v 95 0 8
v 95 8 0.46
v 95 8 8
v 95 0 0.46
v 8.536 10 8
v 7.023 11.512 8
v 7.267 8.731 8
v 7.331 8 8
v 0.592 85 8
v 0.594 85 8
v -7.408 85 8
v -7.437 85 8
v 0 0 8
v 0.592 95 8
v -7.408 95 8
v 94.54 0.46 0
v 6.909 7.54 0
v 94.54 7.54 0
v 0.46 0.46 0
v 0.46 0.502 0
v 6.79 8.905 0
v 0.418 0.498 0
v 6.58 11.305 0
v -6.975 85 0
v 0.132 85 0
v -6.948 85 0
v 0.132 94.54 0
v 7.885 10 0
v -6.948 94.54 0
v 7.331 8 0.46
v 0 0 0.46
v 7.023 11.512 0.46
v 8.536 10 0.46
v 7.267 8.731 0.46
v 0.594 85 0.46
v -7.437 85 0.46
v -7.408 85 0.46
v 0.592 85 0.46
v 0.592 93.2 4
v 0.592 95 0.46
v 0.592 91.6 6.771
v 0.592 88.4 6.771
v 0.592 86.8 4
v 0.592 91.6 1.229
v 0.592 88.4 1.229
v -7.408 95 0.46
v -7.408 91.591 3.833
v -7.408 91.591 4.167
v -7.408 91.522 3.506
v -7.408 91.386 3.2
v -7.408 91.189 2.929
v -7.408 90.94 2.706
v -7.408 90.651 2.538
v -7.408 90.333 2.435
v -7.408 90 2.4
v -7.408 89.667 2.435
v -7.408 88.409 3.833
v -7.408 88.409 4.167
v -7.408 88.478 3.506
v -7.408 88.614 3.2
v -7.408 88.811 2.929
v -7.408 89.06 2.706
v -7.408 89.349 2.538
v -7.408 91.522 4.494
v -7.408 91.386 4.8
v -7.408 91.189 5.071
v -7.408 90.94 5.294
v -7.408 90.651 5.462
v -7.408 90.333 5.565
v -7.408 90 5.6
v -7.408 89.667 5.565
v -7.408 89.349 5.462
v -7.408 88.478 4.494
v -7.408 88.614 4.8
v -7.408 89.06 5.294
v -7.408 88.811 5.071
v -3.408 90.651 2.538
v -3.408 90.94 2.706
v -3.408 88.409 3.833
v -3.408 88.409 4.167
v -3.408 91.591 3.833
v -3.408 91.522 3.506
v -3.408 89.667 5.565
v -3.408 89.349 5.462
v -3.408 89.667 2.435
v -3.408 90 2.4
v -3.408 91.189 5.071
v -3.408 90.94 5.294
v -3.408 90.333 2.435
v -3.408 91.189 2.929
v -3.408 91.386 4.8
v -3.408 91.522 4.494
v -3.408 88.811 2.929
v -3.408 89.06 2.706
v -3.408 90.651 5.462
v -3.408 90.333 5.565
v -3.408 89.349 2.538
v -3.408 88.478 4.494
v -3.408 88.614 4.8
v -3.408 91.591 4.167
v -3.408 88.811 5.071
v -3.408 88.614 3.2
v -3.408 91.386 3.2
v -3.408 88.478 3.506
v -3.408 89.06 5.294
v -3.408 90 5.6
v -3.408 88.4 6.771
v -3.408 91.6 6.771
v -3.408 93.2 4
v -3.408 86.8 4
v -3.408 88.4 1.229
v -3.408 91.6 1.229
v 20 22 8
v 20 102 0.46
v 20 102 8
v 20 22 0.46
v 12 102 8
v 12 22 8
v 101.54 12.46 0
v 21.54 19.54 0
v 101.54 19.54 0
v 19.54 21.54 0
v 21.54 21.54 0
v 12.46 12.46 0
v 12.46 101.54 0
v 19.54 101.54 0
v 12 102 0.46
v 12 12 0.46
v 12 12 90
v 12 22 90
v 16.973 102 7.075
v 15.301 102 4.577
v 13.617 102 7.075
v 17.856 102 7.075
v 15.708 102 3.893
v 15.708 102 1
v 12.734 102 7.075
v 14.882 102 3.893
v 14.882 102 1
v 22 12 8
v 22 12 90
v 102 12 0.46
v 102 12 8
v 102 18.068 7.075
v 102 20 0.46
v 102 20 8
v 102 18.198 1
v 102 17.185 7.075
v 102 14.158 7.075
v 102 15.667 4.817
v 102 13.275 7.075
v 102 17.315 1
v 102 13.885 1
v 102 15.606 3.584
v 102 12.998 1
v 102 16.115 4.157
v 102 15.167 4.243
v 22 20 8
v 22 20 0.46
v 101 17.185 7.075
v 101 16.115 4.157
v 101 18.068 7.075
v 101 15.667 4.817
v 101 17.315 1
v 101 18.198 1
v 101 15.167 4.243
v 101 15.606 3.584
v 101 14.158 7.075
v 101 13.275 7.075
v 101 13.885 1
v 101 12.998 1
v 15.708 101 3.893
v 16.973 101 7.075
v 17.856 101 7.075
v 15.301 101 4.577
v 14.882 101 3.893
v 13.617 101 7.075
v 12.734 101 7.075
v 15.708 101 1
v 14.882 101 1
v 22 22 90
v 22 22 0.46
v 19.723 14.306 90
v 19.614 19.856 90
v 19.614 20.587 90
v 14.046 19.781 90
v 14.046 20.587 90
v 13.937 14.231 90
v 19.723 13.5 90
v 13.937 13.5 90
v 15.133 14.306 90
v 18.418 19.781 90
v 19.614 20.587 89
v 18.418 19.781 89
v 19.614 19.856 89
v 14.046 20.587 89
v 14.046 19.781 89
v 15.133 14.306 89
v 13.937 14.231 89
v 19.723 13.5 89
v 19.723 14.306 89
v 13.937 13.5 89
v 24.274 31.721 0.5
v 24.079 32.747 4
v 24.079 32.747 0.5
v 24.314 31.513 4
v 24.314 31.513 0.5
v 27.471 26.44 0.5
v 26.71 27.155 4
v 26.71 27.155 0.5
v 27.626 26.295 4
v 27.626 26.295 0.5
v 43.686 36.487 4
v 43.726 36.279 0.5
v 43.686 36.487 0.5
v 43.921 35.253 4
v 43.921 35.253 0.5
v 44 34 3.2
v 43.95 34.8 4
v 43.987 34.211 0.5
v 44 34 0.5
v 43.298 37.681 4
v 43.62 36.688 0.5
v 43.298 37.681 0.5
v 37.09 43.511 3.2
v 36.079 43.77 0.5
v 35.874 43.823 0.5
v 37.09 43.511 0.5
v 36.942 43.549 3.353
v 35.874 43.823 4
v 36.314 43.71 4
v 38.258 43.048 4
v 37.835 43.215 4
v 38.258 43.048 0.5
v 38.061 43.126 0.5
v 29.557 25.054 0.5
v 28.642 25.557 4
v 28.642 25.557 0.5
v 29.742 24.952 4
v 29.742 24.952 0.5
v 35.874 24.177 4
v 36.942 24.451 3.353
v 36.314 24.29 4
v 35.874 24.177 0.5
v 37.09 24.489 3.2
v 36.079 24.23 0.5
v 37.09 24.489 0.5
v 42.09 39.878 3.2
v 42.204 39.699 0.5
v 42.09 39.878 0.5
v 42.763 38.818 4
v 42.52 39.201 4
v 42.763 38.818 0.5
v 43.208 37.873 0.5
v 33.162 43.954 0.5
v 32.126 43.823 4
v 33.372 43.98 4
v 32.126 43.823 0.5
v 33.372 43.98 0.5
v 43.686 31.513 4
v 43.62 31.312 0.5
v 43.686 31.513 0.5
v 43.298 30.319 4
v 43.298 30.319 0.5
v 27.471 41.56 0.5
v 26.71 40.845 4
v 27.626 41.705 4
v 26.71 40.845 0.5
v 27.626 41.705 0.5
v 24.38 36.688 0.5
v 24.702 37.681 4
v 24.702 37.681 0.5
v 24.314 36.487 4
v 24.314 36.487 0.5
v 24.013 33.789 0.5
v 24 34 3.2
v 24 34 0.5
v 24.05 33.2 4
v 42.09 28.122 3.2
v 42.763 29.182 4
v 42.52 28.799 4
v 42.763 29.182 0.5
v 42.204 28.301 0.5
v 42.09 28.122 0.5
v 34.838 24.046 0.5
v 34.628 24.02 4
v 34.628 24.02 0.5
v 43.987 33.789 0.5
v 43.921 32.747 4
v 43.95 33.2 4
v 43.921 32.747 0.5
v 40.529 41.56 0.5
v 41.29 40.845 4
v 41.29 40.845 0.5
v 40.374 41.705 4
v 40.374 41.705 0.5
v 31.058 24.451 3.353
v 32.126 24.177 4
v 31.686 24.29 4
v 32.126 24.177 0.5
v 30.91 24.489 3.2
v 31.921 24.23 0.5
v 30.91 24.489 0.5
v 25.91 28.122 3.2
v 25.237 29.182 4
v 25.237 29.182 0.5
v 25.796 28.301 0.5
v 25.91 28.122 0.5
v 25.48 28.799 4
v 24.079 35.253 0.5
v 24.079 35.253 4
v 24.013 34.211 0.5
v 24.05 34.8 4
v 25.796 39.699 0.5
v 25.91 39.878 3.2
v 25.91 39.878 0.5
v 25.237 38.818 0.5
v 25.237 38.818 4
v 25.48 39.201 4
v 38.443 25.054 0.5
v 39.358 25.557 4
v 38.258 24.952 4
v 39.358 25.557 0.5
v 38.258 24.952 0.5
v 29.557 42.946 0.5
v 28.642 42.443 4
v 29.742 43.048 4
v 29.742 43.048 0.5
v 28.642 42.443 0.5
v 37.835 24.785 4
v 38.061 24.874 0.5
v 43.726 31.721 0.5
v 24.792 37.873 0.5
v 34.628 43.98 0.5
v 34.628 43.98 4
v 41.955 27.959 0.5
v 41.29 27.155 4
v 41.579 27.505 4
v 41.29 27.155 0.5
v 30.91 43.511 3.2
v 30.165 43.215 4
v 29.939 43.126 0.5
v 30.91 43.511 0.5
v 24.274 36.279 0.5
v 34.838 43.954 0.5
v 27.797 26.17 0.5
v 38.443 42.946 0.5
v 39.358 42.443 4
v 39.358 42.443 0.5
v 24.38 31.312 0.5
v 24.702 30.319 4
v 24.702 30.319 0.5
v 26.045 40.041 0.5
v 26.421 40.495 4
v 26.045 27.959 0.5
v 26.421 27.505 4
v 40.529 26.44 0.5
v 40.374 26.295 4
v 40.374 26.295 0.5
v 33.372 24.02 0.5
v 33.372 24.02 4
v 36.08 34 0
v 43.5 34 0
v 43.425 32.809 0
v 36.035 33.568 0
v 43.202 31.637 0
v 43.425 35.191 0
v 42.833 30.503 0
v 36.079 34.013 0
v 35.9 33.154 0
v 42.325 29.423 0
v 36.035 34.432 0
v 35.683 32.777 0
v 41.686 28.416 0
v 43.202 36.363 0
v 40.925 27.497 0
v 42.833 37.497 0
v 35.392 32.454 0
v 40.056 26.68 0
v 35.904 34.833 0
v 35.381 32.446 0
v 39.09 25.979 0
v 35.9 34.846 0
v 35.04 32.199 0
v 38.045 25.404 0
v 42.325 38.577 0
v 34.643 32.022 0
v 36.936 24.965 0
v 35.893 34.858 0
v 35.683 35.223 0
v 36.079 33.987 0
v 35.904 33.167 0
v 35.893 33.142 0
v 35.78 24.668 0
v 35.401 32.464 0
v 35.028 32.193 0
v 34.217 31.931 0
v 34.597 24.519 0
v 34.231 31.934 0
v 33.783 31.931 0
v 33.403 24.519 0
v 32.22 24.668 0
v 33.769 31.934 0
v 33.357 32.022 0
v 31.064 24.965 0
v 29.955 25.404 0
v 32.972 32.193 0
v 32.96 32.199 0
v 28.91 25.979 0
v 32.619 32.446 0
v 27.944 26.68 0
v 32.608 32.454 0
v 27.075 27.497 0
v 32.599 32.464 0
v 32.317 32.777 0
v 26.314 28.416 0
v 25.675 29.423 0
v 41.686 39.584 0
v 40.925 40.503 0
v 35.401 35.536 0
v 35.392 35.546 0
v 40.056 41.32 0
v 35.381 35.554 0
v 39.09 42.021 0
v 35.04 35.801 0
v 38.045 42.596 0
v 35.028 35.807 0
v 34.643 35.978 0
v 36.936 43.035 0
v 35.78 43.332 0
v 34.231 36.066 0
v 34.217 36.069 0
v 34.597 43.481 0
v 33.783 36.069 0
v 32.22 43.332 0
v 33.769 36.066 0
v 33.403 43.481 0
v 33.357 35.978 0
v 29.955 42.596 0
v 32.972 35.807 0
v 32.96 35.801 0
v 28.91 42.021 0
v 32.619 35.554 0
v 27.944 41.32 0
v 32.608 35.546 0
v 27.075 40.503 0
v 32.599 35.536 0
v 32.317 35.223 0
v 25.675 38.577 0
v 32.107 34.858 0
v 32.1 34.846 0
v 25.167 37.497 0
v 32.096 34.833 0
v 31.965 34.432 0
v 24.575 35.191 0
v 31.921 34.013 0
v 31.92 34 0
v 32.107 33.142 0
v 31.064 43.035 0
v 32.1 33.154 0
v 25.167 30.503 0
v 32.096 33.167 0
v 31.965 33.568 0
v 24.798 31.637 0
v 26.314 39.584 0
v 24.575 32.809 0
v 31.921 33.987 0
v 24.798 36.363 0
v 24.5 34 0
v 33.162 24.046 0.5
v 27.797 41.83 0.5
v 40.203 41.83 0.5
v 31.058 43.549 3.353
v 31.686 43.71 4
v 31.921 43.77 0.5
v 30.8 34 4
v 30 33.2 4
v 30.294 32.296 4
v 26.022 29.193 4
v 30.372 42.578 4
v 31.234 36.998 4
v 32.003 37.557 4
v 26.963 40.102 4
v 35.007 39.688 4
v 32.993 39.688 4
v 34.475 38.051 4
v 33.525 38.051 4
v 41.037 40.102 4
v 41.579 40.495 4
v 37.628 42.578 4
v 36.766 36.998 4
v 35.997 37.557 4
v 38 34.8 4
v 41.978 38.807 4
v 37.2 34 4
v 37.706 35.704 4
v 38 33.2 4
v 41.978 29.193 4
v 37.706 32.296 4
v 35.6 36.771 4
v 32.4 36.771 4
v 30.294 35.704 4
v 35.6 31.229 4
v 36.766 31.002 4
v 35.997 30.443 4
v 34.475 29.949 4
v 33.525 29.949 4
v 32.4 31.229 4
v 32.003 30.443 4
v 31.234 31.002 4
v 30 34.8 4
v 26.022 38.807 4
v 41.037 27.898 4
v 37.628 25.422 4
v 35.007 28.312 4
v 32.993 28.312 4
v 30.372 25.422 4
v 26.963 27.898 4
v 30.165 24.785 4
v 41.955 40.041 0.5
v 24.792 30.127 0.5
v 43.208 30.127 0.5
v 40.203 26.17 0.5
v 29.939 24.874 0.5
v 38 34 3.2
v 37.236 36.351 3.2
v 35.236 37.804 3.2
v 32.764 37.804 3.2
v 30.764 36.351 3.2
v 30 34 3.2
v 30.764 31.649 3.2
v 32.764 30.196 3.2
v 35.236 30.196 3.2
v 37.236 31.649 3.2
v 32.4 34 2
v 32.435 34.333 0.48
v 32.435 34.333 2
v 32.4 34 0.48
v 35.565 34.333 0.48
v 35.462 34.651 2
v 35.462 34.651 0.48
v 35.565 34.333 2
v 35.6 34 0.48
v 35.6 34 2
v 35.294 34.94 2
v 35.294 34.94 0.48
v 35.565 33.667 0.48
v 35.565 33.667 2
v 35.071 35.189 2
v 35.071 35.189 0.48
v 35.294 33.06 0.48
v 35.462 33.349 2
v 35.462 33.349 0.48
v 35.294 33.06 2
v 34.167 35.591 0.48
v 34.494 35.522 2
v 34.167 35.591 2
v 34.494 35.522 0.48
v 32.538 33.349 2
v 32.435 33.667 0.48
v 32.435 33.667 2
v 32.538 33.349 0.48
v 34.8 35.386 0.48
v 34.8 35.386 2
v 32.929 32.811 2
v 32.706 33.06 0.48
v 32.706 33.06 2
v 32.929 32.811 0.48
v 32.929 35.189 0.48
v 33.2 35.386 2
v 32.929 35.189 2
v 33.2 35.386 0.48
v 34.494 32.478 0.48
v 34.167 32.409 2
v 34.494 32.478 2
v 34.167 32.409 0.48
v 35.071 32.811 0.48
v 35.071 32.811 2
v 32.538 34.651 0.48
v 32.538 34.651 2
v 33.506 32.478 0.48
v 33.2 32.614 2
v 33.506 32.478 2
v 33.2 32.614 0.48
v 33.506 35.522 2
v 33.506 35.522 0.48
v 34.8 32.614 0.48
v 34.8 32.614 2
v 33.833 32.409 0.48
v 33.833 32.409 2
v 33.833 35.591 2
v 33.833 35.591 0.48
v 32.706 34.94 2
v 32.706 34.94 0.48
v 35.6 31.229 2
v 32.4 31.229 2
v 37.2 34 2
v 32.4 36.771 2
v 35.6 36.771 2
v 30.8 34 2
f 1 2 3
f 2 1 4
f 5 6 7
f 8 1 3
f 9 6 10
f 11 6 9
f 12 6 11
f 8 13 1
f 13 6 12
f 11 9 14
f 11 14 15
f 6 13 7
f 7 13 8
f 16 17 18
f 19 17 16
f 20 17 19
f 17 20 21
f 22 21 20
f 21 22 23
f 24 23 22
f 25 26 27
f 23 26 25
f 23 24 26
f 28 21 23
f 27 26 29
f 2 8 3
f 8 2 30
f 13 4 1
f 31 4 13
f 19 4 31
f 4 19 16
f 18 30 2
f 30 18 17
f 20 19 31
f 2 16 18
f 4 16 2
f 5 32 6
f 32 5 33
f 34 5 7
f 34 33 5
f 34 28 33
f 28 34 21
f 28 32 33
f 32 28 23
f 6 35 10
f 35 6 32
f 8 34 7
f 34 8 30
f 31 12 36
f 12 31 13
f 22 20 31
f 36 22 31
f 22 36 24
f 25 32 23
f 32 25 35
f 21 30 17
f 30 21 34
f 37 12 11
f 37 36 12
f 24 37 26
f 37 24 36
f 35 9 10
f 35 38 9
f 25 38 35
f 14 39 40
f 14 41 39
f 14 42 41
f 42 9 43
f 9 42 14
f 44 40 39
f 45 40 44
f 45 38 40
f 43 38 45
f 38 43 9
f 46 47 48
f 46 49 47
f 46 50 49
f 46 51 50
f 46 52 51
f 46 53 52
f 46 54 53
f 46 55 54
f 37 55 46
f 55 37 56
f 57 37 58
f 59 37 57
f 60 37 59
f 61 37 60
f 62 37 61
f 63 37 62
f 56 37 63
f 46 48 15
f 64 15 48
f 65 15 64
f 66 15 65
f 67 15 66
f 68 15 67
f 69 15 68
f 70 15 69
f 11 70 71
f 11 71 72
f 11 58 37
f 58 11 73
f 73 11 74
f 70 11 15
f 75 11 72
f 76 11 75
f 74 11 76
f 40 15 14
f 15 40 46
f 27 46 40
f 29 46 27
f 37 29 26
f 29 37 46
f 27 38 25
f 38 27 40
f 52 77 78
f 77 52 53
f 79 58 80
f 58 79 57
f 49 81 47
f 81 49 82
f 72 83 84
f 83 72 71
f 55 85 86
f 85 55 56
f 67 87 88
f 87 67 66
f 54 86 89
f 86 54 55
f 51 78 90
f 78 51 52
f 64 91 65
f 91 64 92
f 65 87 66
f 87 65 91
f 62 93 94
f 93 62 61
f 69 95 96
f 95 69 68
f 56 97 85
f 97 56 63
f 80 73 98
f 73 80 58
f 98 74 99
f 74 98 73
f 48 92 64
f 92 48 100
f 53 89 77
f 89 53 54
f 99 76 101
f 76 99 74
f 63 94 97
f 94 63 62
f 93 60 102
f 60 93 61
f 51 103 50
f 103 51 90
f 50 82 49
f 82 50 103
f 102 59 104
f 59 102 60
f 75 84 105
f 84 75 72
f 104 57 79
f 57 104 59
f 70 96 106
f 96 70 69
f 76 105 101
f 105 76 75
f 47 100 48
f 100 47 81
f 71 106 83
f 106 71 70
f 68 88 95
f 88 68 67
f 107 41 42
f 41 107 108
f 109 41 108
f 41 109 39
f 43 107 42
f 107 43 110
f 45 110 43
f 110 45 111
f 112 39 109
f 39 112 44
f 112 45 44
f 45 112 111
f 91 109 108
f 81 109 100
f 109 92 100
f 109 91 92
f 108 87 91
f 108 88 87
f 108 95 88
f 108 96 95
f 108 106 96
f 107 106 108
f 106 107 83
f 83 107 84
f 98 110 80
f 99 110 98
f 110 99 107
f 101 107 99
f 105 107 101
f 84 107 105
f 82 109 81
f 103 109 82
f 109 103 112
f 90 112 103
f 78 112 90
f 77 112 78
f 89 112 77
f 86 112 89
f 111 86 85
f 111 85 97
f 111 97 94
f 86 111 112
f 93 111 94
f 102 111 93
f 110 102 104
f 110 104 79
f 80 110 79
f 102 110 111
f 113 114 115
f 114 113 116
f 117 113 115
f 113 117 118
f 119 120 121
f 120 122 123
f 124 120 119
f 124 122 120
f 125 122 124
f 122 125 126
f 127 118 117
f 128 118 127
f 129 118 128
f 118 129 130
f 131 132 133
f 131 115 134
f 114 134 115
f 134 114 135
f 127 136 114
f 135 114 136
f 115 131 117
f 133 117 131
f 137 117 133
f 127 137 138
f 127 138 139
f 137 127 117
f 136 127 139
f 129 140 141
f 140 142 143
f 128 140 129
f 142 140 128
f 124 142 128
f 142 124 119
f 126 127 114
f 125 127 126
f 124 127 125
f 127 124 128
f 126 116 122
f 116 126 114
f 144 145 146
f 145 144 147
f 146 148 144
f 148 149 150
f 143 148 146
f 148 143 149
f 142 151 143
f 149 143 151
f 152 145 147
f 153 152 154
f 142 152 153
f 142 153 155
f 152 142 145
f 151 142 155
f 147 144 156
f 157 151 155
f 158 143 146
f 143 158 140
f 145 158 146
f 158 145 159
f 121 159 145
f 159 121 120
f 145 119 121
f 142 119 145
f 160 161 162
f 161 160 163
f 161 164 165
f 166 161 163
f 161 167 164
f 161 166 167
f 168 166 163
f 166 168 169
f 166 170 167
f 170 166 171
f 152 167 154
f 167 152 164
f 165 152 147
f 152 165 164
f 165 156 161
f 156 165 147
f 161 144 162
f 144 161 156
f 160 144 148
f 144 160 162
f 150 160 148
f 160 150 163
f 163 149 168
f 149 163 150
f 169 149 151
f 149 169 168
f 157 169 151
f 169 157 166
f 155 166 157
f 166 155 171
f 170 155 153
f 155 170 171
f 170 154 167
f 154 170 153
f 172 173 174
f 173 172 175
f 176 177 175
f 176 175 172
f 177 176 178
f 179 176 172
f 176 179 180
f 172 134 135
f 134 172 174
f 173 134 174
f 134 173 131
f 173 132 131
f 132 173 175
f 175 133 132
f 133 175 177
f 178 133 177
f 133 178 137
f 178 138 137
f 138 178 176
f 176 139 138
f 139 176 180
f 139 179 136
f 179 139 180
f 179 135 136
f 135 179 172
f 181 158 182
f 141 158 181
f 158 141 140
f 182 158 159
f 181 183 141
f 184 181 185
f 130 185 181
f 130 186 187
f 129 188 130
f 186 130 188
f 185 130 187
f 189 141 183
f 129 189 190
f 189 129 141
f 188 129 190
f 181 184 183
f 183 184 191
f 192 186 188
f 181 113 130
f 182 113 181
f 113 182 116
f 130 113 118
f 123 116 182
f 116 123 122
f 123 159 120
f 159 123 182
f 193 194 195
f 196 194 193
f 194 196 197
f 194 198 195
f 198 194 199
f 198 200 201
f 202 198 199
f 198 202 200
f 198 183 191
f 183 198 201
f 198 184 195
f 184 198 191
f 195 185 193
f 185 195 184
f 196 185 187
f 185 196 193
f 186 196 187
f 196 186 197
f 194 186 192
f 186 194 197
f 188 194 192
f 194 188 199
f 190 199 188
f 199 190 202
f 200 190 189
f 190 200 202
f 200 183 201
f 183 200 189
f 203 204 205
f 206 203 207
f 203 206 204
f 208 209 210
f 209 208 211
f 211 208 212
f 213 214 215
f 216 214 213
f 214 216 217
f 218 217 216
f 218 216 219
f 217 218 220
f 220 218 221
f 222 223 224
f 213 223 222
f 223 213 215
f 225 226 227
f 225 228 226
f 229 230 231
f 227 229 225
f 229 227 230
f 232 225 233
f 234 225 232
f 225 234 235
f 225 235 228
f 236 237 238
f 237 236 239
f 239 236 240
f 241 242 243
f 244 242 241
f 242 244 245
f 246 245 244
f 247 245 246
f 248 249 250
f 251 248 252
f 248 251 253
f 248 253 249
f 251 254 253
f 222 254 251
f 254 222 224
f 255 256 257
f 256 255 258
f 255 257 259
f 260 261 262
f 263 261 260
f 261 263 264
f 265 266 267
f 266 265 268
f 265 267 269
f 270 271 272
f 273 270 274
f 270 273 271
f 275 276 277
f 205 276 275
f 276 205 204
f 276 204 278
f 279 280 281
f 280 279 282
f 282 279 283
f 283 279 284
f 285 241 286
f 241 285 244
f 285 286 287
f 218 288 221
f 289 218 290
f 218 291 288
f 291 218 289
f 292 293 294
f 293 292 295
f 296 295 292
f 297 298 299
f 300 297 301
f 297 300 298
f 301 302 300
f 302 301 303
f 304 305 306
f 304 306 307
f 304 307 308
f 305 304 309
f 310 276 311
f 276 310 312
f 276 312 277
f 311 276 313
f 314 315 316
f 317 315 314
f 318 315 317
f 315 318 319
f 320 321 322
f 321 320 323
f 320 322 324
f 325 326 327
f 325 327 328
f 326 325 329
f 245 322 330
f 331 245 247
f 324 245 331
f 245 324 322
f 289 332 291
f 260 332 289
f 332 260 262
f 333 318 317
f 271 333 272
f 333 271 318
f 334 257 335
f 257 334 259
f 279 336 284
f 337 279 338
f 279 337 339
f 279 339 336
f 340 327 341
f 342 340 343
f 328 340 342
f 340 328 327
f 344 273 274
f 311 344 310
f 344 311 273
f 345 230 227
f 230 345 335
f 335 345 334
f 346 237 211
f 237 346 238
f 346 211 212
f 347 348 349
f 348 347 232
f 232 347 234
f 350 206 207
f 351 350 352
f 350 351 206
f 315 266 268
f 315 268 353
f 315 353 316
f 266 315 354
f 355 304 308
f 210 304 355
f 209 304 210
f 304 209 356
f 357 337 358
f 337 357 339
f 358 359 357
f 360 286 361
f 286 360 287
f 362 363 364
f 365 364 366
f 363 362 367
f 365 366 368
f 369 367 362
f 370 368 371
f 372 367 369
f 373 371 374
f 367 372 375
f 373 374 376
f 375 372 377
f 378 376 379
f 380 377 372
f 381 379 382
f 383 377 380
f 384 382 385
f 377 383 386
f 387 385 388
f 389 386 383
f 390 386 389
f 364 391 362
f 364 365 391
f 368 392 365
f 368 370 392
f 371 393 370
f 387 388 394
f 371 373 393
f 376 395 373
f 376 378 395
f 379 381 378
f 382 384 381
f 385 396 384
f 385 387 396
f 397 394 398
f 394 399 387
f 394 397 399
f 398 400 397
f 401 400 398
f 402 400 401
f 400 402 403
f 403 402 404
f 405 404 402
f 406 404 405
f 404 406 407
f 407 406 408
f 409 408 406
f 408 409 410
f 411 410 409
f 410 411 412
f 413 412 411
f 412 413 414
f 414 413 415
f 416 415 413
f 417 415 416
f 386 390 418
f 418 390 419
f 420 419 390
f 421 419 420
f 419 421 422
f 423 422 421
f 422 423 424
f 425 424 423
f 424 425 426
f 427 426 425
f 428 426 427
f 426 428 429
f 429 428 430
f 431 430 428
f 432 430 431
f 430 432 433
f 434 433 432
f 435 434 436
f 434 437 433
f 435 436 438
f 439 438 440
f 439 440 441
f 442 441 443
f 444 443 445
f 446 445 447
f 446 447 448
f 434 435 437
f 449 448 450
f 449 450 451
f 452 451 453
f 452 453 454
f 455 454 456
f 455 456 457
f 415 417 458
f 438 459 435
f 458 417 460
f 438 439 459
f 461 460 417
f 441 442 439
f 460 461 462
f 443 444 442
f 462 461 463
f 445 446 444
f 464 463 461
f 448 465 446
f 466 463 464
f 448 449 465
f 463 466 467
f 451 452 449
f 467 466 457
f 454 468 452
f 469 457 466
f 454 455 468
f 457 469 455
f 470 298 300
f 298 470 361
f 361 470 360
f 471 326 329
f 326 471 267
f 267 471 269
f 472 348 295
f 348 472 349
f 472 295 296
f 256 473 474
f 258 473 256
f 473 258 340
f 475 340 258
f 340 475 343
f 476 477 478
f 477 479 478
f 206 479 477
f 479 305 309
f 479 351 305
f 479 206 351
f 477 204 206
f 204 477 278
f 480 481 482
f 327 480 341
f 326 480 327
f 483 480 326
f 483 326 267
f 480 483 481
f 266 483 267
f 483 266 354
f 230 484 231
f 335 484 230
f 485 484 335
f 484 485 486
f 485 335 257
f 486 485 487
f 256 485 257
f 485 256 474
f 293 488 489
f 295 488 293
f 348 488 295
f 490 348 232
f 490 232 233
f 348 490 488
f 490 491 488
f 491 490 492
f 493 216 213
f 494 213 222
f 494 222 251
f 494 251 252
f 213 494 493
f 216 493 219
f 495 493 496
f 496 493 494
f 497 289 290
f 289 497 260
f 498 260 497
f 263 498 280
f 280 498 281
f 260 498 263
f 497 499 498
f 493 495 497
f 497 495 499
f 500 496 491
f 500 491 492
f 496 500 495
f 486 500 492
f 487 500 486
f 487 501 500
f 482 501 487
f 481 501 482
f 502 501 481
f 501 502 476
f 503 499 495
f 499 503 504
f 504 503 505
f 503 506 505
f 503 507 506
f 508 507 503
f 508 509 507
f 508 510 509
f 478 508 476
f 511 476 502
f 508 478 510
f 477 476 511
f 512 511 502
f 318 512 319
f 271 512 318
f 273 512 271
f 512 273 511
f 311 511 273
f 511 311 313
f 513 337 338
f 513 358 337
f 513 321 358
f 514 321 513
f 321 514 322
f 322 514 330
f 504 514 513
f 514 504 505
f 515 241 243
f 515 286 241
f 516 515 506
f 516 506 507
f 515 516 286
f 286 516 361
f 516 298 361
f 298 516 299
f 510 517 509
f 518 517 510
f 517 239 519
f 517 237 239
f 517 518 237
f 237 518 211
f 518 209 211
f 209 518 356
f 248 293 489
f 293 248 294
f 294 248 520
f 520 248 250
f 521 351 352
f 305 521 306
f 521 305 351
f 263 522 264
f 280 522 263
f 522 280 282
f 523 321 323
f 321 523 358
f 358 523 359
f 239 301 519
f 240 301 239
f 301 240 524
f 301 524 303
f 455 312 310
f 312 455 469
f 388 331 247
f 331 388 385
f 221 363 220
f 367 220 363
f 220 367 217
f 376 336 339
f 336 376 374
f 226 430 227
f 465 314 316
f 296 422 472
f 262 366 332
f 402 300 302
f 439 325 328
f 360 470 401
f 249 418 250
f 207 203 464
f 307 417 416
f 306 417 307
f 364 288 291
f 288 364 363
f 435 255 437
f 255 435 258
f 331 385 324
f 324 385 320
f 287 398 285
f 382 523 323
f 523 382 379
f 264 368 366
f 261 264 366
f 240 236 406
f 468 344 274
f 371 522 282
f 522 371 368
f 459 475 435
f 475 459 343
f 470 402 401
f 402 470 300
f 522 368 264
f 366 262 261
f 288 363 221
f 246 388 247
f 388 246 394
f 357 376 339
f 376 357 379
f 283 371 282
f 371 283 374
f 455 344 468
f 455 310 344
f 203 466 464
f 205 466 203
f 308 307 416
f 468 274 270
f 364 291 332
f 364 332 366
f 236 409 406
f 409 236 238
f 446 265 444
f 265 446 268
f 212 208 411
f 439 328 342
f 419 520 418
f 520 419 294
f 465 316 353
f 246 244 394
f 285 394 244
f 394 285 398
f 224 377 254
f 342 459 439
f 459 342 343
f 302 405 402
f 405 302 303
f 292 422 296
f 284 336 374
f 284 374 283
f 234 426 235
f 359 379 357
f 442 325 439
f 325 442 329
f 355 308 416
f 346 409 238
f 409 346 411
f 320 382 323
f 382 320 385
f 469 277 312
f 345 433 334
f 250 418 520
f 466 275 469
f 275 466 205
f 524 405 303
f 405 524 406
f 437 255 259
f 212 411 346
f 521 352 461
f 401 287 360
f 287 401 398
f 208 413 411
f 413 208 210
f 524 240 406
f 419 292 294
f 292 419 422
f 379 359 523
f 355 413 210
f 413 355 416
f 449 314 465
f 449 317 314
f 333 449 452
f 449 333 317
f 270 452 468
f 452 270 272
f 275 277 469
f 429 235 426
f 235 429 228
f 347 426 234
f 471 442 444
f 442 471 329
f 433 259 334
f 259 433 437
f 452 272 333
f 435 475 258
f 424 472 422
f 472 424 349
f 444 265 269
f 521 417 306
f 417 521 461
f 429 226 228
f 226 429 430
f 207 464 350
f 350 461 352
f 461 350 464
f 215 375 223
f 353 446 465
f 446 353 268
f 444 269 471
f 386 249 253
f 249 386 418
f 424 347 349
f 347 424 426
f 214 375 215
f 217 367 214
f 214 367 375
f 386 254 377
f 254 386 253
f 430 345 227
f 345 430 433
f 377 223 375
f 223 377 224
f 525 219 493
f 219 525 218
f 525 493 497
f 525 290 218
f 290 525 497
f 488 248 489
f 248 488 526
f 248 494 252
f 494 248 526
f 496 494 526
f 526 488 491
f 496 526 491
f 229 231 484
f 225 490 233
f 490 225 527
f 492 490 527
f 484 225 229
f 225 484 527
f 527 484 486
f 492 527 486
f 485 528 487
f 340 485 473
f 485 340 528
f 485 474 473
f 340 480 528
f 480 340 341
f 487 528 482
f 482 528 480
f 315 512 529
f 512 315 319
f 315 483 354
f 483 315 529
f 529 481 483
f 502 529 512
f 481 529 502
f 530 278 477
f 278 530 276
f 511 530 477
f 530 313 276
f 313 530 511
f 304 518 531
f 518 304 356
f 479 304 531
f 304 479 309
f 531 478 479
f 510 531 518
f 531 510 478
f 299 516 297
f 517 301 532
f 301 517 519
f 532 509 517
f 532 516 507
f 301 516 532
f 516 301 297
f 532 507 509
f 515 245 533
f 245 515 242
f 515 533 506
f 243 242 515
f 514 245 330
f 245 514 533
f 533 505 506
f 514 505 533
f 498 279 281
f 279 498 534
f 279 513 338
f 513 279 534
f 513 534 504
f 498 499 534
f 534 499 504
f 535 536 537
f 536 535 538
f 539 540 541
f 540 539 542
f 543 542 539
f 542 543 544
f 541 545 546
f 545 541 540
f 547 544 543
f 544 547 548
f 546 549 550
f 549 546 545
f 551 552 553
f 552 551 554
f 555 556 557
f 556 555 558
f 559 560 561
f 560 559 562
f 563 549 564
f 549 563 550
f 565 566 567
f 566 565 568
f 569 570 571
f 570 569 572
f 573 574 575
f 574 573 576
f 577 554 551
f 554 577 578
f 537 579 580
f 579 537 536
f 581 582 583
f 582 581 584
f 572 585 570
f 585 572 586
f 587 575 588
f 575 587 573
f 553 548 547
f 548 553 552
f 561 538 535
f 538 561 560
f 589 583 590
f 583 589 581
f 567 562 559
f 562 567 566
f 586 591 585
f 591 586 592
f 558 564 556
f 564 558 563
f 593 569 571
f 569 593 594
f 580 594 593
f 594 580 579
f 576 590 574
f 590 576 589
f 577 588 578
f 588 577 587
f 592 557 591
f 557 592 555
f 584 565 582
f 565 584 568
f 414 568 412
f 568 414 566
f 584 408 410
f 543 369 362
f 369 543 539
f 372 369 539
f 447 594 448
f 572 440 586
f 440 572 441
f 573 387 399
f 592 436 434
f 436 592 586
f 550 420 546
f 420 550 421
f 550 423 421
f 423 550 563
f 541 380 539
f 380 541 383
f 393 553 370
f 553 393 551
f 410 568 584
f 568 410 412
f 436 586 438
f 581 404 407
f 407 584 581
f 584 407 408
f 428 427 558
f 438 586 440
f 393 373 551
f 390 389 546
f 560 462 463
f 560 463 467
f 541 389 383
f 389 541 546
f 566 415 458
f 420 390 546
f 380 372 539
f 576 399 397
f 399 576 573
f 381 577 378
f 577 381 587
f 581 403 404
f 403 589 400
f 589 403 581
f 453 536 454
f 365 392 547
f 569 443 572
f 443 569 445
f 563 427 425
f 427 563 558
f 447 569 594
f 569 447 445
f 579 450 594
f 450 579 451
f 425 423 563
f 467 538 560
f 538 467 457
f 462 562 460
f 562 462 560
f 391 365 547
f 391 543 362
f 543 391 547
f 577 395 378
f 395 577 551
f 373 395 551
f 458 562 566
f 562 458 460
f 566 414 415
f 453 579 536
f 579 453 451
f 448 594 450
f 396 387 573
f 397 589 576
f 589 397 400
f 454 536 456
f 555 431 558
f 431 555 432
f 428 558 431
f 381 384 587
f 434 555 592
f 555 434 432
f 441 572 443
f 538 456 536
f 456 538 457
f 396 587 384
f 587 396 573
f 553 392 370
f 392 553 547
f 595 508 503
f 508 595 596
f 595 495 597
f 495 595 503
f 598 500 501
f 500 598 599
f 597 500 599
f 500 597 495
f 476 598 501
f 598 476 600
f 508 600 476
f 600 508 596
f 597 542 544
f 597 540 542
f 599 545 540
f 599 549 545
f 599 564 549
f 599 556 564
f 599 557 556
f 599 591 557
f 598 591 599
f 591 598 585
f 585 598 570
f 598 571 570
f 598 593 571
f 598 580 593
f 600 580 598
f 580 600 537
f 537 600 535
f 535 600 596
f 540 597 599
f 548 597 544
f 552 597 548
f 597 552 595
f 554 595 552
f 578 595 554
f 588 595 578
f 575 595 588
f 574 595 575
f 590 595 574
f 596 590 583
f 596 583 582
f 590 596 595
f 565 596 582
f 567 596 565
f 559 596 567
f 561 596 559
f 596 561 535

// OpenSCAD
// OpenSCAD file for producing the testpiece, gauge and thumbwheel for orthogonal axis compensation for RepRapPro Ormerod, Mendel and Huxley printers //
// Revised with text. You need to use OpenSCAD version 2015.03 for the test to render correctly, and Arial Black installed as a font //

long = 90; // Set length for testpiece here
chamfer=0.5;

// comment out the following lines to get the parts you want. Comment out the translations if you want the part at the origin.

Gauge();

translate ([12,12,0])
TestPiece();

translate ([34,34,0])
ThumbWheel();



module Gauge()
{
    union()
     {
         chamfer_cube(long+5,8,8);
         translate([5, 10, 4]) rotate([0,0,45]) chamfer_cube(5,5,8,ctr=true);
         
         difference ()
         {
             rotate([0,0,5]) chamfer_cube(8,long,8);
             translate ([-sin(5)*(long-5)-1,(long-5),-1]) cube([10,11,10]);
         }
         
         translate ([-sin(5)*(long-5),(long-5),0]) difference ()
         {
             chamfer_cube(8,10,8,x1=false);
             translate([4,5,4]) rotate([0,90,0]) cylinder(r=1.6,h=10,center=true,$fn=30);
             translate([4,5,4]) rotate([90,0,90]) cylinder(r=3.2,h=6,center=false,$fn=6);
         }
     }
}

module ThumbWheel()
{
	difference()
	{
		intersection ()
		{
			cylinder(r=10,h=4,center=false,$fn=50);
			cylinder(r1=10-chamfer,r2=10+4-chamfer,h=4,center=false,$fn=50);
		}
		translate ([0,0,-1]) cylinder(r=1.6,h=6,center=false,$fn=30);
		translate ([0,0,-0.02]) cylinder(r1=1.6+chamfer,r2=1.6,h=chamfer,center=false,$fn=30);
		translate([0,0,2]) cylinder(r=3.2,h=3,center=false,$fn=6);

		for(a = [0 : 36 : 360] )
		{
		rotate([0,0,a]) translate([4,0,3.2]) rotate([45,0,0])
            cube([7,1.5,1.5]);
		}
	}
}


module TestPiece()
{
 union()
 {
	difference ()
     {
         chamfer_cube(long,8,8);
         translate ([long-1,0.75,1]) rotate ([90,0,90]) 
         linear_extrude(height = 1.1) text("X", font="Arial Black", size=6);
     }

	difference ()
     {
         chamfer_cube(8,long,8);
         translate ([0.75,long+0.1,1]) rotate ([90,0,0]) 
         linear_extrude(height = 1.1) text("Y", font="Arial Black", size=6);
     }

	difference ()
     {
         chamfer_cube(10,10,long);
         translate ([1.5,1.5,long-1]) 
         linear_extrude(height = 1.1) text("Z", font="Arial Black", size=7);
     }


 }
}

module chamfer_cube (x,y,z,h=chamfer,ctr=false,x1=true,x2=true,y1=true,y2=true)
{
    dh = sqrt(2*pow(h,2));

	if (ctr==true)
    {
        translate ([-x/2,-y/2,-z/2]) difference ()
        {
            cube([x,y,z]);
            if (x1==true) {translate([x/2,-0.02,-0.02]) rotate ([45,0,0]) cube([x+1,dh,dh],center=true);}
            if (x2==true) {translate([x/2,y+0.02,-0.02]) rotate ([45,0,0]) cube([x+1,dh,dh],center=true);}
            if (y1==true) {translate([-0.02,y/2,-0.02]) rotate ([0,45,0]) cube([dh,y+1,dh],center=true);}
            if (y2==true) {translate([x+0.02,y/2,-0.02]) rotate ([0,45,0]) cube([dh,y+1,dh],center=true);}
        }
    }
    else
    {
        difference ()
        {
            cube([x,y,z]);
            if (x1==true) {translate([x/2,-0.02,-0.02]) rotate ([45,0,0]) cube([x+1,dh,dh],center=true);}
            if (x2==true) {translate([x/2,y+0.02,-0.02]) rotate ([45,0,0]) cube([x+1,dh,dh],center=true);}
            if (y1==true) {translate([-0.02,y/2,-0.02]) rotate ([0,45,0]) cube([dh,y+1,dh],center=true);}
            if (y2==true) {translate([x+0.02,y/2,-0.02]) rotate ([0,45,0]) cube([dh,y+1,dh],center=true);}
        }        
	}
}
